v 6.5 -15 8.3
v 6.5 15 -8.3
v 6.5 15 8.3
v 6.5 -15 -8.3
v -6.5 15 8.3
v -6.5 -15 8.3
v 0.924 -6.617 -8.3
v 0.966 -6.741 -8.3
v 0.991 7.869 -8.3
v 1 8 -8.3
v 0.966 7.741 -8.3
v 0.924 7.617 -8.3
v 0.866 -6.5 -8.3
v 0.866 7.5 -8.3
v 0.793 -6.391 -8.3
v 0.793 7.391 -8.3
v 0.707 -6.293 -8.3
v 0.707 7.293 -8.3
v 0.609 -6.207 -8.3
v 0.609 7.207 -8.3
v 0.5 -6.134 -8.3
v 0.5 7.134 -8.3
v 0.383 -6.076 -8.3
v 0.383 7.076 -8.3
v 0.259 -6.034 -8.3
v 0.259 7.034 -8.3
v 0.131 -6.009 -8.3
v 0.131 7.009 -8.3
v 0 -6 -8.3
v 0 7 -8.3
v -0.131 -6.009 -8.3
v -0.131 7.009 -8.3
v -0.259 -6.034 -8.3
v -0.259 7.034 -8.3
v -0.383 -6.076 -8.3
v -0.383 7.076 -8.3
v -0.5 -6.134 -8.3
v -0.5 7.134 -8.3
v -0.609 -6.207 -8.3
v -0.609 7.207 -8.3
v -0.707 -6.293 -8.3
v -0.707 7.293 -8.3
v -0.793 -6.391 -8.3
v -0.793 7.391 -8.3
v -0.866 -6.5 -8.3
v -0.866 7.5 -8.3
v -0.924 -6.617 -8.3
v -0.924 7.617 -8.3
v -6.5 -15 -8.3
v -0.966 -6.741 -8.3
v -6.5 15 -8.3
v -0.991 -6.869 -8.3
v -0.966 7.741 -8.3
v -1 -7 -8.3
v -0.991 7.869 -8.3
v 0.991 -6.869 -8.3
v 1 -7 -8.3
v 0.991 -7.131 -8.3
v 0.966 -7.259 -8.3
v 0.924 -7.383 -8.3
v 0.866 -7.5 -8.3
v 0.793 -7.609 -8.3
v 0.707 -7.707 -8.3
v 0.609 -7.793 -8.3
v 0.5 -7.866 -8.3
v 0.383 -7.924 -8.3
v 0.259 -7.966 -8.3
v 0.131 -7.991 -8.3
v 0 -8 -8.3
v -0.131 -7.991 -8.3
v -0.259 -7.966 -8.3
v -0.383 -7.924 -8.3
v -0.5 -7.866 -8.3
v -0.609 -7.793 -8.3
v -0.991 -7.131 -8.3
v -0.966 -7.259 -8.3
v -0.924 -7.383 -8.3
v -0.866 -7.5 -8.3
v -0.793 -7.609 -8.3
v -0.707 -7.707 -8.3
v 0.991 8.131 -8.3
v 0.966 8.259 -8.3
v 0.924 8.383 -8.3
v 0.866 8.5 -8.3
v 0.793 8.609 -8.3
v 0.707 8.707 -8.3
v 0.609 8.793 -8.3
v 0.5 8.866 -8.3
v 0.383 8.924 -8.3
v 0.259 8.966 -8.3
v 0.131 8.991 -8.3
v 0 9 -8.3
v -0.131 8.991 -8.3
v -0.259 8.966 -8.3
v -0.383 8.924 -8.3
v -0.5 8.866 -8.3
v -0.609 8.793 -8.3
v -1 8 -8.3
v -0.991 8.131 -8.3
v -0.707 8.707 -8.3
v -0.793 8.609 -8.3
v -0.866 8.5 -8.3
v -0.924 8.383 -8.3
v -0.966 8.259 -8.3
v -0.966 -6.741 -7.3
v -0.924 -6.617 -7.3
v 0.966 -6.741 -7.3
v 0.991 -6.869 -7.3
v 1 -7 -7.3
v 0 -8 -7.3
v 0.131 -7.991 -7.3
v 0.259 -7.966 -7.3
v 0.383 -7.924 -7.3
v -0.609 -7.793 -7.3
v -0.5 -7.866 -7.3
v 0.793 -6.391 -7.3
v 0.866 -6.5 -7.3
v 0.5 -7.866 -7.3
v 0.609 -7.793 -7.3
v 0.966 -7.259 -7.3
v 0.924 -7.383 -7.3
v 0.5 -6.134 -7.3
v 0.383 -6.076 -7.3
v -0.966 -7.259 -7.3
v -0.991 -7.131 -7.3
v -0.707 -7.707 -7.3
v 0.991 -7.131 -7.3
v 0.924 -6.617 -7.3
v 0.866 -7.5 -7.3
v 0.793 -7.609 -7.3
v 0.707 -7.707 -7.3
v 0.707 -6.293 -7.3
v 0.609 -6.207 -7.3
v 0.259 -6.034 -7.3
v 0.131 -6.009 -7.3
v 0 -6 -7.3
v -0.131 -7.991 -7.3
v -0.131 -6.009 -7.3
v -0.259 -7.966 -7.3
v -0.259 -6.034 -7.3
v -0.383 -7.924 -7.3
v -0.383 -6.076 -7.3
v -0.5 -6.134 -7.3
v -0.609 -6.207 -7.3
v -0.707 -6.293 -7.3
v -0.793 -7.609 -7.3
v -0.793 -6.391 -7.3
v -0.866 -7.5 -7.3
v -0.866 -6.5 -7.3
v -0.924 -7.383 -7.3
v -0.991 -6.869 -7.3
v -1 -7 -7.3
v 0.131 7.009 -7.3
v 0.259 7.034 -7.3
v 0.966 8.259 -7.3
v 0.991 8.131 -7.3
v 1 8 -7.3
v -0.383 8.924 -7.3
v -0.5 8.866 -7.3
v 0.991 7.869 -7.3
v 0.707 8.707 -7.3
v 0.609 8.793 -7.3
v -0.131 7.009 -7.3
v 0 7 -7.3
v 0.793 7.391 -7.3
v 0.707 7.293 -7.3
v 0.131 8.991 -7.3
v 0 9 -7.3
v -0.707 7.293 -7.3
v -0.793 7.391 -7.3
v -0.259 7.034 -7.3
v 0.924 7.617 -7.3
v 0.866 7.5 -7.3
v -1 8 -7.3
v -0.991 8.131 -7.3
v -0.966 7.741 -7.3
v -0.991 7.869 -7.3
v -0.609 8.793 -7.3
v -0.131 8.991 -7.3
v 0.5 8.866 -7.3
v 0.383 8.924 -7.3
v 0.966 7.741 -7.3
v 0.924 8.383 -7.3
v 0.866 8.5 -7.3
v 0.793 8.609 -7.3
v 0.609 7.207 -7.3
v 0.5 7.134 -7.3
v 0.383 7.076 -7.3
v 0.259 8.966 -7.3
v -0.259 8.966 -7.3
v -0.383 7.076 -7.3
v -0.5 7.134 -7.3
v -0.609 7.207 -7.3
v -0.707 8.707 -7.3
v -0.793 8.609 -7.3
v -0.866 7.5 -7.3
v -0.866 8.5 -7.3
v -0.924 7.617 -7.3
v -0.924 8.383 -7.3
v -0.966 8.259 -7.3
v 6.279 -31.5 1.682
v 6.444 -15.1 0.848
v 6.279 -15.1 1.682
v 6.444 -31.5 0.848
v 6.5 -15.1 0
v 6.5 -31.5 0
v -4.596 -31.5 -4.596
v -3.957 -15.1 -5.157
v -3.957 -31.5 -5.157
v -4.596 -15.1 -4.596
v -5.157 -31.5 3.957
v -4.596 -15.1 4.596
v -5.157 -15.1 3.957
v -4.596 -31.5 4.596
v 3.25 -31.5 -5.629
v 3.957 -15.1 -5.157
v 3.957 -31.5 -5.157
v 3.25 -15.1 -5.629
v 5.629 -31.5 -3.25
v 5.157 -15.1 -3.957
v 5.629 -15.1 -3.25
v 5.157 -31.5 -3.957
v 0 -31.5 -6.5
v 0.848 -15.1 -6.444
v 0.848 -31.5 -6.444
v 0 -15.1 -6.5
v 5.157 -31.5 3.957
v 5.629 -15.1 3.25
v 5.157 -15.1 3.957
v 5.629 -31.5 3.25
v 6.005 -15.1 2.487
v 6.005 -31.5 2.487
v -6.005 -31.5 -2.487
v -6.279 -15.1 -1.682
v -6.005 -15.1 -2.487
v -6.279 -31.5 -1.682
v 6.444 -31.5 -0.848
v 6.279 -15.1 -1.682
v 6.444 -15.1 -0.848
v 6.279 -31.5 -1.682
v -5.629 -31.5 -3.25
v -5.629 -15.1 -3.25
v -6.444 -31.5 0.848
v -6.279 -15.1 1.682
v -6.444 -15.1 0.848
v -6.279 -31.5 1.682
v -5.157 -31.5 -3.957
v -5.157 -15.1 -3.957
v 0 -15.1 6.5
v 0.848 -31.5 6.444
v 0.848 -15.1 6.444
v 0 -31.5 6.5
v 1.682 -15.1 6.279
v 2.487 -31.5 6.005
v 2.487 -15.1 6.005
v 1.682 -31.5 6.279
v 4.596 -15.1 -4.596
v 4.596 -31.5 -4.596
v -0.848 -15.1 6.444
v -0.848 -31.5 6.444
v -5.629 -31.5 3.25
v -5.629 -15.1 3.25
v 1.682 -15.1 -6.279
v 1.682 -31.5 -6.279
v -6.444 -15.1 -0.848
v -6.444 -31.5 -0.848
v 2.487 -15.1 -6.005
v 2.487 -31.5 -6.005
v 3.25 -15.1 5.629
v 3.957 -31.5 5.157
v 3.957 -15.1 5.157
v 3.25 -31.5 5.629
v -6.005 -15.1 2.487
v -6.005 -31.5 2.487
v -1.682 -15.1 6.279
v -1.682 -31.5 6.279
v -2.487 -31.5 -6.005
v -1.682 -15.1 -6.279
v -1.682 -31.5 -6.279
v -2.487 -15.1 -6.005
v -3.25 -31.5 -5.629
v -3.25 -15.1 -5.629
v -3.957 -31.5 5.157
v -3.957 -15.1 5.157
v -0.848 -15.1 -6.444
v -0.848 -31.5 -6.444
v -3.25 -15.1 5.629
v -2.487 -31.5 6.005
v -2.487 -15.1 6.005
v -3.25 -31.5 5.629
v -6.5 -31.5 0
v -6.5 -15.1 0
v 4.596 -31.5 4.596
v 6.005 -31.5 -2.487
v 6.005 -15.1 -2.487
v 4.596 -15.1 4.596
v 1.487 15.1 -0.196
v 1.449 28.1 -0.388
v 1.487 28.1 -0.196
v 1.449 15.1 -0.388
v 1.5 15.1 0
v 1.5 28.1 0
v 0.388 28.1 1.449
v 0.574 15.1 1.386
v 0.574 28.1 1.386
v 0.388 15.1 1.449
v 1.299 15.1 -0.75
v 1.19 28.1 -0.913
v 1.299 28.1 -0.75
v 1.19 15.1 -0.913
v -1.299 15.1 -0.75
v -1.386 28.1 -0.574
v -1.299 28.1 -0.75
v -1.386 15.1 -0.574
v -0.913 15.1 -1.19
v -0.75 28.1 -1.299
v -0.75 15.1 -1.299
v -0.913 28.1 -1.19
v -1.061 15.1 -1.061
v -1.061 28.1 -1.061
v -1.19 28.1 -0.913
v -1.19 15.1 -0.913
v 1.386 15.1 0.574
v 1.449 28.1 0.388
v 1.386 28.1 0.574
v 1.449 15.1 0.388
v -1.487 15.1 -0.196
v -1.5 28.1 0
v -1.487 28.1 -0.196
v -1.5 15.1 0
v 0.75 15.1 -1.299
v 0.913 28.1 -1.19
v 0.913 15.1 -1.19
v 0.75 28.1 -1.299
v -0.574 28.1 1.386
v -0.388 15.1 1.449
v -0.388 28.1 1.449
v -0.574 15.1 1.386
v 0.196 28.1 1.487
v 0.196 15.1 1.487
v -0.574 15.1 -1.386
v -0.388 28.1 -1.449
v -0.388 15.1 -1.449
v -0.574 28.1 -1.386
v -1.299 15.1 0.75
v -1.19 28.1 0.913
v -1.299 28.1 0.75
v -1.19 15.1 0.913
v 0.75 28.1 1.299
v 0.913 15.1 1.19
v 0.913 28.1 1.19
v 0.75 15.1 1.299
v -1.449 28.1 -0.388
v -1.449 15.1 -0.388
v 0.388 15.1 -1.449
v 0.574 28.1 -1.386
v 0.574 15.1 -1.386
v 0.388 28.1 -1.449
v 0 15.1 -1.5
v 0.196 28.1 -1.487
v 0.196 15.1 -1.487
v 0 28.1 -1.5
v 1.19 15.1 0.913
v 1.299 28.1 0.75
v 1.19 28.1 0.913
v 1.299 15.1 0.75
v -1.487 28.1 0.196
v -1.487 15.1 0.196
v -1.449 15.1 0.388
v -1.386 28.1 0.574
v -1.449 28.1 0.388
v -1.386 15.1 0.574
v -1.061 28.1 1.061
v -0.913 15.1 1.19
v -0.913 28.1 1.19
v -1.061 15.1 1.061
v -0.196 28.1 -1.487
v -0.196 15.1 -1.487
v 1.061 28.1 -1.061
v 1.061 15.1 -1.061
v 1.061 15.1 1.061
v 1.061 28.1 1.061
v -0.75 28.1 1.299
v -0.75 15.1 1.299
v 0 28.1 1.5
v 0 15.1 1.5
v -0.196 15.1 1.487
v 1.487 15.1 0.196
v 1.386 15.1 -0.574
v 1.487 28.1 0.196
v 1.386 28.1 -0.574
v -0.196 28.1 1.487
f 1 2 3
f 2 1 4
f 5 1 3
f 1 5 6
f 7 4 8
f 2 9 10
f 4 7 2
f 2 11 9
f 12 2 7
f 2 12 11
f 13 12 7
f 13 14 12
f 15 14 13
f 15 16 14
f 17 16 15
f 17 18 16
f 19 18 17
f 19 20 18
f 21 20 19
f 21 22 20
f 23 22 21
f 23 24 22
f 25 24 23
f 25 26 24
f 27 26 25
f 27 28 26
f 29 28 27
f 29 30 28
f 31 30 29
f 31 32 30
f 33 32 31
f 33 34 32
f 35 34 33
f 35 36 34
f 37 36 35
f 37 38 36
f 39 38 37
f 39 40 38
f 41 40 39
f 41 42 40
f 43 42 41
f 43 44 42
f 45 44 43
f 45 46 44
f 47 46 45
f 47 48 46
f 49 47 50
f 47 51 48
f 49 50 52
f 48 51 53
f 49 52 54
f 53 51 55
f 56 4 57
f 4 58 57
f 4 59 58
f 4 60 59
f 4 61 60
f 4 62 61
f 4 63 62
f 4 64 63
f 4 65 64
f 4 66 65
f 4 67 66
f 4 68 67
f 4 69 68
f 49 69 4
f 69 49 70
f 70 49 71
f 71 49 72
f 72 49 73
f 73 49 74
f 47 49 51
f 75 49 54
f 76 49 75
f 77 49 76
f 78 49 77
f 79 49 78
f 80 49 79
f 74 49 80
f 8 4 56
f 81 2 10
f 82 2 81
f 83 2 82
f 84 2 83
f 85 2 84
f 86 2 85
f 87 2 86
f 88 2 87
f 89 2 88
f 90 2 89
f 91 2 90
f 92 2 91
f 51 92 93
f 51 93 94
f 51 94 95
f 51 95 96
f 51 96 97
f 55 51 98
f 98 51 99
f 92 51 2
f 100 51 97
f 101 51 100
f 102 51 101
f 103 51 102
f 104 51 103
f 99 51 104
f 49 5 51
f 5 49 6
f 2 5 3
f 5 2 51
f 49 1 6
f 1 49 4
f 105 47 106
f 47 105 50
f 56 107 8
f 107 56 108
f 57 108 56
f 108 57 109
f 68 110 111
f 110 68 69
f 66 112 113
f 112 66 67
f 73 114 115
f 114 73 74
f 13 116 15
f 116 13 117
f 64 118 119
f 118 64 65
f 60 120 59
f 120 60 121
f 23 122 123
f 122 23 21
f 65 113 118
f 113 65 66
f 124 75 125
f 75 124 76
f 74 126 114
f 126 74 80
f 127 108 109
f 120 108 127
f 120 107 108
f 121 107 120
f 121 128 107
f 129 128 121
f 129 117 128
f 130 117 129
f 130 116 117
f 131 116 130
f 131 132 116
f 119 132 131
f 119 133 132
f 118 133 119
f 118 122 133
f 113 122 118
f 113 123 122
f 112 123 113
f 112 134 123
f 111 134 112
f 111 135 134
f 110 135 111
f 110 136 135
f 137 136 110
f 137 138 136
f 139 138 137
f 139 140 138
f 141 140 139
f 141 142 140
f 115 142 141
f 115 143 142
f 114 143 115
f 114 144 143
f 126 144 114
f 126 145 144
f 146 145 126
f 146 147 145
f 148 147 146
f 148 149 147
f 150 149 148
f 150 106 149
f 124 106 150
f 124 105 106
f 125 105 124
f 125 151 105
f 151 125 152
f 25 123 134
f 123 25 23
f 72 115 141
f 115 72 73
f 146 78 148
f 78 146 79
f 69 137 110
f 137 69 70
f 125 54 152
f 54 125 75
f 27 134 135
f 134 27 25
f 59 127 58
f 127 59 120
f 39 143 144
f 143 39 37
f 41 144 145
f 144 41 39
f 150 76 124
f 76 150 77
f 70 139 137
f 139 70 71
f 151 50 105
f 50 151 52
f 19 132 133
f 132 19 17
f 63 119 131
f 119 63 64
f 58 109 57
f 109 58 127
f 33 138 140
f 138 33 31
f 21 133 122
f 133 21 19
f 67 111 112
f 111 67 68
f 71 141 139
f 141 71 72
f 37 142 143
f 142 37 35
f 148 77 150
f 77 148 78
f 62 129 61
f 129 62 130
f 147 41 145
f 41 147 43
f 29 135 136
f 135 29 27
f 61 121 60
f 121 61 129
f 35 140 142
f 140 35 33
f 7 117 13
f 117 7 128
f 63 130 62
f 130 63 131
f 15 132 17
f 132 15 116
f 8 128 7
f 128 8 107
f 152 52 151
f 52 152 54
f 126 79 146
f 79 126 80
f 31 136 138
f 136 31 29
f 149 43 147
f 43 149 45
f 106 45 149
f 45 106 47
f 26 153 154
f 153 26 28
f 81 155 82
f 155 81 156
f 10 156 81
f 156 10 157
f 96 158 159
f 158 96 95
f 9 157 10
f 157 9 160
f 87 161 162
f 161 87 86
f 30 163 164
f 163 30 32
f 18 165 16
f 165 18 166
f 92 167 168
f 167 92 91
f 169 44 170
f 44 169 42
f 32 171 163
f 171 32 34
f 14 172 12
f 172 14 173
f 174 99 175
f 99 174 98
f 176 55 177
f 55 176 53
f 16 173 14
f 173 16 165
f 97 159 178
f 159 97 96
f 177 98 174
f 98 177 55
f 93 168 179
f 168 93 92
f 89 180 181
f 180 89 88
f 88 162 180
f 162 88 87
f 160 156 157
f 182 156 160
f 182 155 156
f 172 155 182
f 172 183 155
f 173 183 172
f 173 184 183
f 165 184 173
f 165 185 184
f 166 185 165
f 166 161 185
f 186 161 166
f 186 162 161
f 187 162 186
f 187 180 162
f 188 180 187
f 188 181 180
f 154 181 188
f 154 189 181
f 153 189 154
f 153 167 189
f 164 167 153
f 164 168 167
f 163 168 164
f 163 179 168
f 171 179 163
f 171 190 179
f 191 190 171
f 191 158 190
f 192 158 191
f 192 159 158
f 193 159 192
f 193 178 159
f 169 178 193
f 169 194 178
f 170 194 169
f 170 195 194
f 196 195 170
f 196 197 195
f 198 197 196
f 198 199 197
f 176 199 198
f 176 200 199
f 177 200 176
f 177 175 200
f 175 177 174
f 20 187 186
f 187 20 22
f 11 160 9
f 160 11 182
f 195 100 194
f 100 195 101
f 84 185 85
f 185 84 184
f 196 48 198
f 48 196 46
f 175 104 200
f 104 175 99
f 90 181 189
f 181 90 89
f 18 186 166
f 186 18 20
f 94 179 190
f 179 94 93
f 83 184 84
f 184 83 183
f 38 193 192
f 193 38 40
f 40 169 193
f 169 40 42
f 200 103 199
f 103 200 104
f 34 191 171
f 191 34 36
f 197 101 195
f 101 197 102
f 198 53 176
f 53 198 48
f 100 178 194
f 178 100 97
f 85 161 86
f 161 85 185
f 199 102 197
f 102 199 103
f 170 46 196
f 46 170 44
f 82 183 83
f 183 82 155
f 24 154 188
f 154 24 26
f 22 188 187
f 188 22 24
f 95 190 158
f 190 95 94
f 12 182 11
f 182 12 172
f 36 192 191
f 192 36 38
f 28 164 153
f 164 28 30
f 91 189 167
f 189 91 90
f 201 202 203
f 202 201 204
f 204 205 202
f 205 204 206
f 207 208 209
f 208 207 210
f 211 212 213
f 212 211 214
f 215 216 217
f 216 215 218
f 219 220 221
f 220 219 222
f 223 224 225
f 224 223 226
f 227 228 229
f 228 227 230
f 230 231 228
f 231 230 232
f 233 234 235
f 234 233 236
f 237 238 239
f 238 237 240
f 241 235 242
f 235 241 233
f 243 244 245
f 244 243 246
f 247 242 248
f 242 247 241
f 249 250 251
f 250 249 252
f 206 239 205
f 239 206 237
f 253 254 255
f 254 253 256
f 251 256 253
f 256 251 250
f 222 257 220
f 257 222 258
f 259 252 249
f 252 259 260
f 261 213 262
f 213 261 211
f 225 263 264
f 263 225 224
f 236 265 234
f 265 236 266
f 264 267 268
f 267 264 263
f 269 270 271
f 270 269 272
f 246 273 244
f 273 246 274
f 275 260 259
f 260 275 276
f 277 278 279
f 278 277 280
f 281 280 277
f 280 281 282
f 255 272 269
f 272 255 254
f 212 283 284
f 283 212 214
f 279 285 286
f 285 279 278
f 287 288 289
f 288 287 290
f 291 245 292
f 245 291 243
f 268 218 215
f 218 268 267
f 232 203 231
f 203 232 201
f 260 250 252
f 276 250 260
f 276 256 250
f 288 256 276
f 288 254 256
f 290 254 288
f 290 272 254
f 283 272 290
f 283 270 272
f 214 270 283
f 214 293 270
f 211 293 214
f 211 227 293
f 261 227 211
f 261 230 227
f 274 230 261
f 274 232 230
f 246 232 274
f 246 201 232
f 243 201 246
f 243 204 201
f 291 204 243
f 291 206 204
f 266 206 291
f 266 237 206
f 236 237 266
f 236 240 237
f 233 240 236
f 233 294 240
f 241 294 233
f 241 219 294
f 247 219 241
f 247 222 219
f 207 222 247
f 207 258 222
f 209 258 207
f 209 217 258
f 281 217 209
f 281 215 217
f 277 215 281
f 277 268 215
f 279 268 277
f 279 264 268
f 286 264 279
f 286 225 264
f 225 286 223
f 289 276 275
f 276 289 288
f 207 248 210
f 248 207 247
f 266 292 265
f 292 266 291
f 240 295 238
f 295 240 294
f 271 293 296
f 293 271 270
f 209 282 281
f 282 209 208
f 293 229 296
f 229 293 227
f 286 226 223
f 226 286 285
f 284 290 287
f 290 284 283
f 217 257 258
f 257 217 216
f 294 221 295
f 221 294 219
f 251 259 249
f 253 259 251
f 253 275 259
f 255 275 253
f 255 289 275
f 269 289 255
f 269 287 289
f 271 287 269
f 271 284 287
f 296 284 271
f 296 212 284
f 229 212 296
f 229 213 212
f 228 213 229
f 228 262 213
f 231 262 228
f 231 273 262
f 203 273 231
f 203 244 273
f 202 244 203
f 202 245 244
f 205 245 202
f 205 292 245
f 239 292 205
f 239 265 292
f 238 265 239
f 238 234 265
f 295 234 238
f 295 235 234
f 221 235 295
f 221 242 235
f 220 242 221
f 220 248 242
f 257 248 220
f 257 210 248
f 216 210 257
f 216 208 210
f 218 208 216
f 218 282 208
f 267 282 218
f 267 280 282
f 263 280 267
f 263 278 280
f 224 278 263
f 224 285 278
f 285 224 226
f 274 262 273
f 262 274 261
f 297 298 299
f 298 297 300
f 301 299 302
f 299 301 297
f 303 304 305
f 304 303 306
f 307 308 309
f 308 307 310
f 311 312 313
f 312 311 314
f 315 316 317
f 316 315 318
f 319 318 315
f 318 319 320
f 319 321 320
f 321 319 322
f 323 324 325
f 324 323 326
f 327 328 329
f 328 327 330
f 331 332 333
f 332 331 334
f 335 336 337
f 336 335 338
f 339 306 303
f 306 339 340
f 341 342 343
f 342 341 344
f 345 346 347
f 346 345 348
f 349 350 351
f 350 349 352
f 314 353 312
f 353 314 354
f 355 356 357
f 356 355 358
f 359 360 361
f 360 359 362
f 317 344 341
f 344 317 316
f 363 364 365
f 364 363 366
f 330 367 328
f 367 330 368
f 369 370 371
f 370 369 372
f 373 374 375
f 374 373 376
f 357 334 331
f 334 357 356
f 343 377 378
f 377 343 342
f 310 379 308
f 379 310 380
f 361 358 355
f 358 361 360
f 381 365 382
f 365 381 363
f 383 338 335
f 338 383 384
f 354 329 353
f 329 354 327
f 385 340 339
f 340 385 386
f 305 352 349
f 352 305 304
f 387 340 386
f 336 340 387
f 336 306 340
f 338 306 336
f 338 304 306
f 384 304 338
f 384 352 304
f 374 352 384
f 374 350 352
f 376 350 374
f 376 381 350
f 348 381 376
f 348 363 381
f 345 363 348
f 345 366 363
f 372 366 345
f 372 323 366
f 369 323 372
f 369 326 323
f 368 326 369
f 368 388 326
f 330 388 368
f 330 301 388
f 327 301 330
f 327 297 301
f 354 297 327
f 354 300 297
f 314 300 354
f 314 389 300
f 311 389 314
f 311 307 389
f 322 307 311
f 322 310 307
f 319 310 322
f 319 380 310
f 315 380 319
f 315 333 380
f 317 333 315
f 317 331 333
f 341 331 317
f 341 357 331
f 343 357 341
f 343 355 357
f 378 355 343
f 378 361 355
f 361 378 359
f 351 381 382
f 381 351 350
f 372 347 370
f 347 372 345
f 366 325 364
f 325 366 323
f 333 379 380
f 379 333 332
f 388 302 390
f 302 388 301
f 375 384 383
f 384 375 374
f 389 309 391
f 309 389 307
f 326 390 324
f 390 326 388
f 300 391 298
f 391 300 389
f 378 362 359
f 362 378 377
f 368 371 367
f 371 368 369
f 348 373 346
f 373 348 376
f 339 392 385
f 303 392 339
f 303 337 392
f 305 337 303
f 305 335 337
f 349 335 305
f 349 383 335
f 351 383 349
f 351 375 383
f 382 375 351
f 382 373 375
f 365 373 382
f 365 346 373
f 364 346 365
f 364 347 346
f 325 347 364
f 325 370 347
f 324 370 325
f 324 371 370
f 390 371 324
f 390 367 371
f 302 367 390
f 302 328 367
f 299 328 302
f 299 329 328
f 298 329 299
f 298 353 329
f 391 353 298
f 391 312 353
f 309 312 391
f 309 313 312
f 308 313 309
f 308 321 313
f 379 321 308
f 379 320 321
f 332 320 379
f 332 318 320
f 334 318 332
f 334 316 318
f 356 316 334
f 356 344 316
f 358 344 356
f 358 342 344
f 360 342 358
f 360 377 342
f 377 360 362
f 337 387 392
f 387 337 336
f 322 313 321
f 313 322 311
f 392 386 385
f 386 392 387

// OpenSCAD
ep=0.001;//epsilon
epp=ep*2;
$fn=48;

module solenoid(depl=0){
	difference(){
		cube([13,30,16.6],center=true);
		translate([0,-7,-8.3-ep])cylinder(h=1+ep,d=2);
		translate([0,8,-8.3-ep])cylinder(h=1+ep,d=2);
	}
	translate([0,-15.1,0])rotate([90,0,0])cylinder(h=21.4-depl,d=13);
	translate([0,15.1,0])rotate([-90,0,0])cylinder(h=8+depl,d=3);
}
solenoid(5+(sin(360*$t)*5));
